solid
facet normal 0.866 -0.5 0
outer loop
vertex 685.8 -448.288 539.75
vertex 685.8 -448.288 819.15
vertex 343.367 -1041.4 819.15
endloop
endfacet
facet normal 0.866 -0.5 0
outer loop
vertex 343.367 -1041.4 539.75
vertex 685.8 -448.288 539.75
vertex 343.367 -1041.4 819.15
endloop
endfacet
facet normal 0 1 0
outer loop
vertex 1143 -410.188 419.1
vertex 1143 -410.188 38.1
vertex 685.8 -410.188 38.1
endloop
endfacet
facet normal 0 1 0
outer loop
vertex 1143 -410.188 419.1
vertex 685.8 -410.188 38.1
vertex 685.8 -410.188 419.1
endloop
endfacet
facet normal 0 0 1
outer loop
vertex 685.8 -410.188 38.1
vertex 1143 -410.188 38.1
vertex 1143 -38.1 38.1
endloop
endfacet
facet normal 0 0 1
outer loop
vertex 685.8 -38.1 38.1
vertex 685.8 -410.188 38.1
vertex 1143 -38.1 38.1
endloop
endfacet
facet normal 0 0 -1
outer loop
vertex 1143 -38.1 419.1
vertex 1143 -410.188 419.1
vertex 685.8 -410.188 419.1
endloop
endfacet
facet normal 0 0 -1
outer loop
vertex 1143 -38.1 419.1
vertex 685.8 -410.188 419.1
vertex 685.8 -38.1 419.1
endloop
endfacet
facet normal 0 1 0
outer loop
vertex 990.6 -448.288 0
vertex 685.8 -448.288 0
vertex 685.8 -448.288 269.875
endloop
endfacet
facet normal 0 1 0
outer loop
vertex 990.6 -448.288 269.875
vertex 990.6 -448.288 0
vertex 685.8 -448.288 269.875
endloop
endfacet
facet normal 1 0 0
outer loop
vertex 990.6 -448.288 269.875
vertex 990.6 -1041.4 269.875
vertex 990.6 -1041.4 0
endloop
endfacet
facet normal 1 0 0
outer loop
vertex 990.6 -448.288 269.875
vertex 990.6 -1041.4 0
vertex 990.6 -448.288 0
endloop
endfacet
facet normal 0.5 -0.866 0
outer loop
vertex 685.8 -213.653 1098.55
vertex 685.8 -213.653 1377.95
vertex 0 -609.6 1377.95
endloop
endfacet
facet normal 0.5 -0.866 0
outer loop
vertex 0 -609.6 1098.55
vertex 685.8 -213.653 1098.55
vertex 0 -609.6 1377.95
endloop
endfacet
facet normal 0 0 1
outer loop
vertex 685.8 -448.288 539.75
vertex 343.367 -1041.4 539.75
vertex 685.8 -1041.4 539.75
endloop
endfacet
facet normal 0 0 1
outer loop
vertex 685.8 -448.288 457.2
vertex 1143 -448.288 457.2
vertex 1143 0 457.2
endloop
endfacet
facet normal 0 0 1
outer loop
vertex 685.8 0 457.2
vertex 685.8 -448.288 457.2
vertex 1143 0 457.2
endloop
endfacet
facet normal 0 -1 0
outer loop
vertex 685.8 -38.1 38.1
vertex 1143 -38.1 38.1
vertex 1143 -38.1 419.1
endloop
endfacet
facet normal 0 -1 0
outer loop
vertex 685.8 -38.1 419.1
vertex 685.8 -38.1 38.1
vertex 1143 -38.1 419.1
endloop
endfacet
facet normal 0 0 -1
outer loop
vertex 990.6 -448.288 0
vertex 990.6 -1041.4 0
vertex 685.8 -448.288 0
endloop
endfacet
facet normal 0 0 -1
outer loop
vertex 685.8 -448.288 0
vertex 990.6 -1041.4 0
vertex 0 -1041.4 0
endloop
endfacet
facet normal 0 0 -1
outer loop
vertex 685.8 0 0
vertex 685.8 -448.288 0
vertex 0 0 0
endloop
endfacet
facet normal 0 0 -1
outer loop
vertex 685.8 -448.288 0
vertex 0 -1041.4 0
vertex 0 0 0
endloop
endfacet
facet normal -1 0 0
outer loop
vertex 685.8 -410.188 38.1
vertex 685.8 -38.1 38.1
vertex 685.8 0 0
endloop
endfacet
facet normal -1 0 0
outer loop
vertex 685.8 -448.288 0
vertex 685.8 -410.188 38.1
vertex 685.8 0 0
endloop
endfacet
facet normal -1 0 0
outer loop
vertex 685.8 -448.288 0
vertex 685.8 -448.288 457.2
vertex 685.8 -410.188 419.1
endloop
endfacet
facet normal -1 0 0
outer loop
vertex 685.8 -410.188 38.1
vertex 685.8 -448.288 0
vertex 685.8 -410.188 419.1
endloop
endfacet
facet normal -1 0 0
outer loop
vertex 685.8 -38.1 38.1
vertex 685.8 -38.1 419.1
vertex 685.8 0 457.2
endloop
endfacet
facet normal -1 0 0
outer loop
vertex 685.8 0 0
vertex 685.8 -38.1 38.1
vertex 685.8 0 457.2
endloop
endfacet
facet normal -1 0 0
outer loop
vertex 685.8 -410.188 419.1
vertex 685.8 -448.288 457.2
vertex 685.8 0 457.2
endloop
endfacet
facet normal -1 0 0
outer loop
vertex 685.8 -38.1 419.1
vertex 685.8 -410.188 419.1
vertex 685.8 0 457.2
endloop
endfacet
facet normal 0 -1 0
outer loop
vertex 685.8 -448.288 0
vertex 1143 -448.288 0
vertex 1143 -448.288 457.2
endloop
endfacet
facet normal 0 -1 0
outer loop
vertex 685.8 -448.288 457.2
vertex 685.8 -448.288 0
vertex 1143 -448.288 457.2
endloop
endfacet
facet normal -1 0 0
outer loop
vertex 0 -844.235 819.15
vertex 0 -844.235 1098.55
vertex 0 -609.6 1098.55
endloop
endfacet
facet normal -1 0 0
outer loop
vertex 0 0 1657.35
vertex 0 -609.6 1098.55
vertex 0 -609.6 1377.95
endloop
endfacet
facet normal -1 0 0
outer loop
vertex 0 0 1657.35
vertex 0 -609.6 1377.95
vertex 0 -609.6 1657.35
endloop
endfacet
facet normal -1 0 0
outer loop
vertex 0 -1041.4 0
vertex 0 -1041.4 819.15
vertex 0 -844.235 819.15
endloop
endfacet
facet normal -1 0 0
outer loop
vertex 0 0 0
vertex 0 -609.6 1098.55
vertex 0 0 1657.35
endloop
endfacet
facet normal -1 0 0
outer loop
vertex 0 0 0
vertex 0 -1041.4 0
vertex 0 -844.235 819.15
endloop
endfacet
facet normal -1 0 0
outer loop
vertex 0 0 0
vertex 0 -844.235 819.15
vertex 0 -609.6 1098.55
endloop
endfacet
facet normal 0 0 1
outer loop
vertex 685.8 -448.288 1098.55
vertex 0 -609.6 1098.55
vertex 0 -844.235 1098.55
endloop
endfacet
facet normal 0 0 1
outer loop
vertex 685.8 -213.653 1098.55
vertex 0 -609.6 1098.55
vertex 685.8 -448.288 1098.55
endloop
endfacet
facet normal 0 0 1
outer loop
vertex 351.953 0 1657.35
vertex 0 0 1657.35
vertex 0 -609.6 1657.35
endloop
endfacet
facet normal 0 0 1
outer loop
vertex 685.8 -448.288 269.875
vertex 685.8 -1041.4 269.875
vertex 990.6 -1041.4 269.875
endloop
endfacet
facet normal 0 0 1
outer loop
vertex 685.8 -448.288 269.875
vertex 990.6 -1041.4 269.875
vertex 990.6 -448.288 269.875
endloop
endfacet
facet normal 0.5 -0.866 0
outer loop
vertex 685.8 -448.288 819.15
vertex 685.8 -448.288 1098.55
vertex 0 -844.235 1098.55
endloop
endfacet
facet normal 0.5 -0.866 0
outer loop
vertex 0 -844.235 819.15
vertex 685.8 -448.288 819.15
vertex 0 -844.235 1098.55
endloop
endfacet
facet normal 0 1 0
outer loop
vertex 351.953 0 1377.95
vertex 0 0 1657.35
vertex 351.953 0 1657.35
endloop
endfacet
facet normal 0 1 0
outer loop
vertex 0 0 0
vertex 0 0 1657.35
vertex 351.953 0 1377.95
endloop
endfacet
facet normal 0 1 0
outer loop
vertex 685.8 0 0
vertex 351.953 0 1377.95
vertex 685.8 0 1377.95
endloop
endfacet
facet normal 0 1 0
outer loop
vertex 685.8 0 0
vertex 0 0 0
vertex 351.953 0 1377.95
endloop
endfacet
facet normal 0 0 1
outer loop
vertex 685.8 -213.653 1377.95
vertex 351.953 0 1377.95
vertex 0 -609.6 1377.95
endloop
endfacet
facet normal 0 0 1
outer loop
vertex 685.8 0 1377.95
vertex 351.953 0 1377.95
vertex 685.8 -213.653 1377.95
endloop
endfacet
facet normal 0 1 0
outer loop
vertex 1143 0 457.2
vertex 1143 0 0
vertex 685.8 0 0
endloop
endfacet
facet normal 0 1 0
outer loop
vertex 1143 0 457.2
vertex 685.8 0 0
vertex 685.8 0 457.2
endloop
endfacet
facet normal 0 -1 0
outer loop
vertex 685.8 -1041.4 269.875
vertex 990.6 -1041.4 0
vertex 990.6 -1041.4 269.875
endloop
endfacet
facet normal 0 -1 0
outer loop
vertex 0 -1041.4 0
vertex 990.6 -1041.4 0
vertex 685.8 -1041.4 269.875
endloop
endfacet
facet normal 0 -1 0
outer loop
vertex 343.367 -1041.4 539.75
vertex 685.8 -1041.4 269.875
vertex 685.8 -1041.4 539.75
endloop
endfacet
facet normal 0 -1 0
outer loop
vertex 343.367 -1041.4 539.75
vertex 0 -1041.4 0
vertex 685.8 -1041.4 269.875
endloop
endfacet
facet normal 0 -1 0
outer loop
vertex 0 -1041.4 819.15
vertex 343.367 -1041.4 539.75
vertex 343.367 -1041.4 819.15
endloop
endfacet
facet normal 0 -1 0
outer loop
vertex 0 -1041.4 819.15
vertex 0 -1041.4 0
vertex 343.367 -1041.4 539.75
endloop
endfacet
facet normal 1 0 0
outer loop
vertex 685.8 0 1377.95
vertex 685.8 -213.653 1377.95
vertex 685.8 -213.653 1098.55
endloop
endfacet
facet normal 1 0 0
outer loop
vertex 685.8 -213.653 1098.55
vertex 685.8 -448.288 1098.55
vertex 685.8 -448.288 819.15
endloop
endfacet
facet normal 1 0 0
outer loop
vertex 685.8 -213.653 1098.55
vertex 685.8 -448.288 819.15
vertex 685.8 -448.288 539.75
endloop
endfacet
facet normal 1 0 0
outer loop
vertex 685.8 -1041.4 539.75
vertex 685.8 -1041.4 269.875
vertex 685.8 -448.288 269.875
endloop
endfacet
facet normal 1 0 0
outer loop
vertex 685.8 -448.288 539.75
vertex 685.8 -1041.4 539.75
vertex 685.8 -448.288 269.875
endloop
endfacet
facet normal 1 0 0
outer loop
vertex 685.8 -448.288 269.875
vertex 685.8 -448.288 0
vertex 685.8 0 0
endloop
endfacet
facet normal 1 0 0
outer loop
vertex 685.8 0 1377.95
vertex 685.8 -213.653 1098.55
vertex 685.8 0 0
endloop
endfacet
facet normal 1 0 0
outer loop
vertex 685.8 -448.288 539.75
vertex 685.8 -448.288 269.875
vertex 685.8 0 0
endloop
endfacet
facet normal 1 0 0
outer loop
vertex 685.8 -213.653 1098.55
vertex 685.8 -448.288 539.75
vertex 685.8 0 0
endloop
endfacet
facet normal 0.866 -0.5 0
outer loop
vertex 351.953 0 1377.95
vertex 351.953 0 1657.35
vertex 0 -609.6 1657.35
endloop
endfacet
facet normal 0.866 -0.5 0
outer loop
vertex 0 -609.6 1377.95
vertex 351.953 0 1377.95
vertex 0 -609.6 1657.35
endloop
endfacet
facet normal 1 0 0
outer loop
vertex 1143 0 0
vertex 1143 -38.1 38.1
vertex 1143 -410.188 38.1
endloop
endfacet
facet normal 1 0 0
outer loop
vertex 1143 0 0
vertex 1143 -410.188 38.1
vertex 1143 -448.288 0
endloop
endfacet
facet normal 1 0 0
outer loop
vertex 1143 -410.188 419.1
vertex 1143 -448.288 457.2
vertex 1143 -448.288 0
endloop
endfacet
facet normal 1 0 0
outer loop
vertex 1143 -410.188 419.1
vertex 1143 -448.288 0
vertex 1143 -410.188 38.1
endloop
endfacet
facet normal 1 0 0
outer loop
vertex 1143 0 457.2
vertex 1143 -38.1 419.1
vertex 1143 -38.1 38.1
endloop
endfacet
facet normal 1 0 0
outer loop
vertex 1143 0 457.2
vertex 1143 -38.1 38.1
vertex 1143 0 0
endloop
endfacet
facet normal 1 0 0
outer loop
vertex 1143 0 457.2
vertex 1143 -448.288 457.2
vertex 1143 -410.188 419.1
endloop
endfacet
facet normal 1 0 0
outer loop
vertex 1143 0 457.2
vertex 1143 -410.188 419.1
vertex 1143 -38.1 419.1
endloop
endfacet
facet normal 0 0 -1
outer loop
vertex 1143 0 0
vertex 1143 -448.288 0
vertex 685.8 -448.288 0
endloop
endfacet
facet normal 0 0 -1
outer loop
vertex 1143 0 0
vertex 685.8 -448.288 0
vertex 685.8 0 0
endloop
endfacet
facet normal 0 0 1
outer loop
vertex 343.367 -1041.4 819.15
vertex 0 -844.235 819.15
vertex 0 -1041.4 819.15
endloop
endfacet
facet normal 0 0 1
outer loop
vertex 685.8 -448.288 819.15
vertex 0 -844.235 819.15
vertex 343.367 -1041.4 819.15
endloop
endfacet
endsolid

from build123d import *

# Parameters (mm, degrees)
F0_W      = 685.8
F0_H      = 1041.4
F1_DEPTH  = 1657.35
F3_DEPTH  = 279.4
F5_DEPTH  = 279.4
F7_DEPTH  = 279.4
F9_DEPTH  = 279.4
F10_W     = 593.1116652116
F10_H     = 269.875
F11_DEPTH = 304.8
F12_W     = 448.2883347884
F12_H     = 457.2
F13_DEPTH = 457.2
F14_W     = 372.0883347884
F14_H     = 381
F15_DEPTH = 1143.001


with BuildPart() as f1:
    # F0 (on Top) → F1 (new body)
    with BuildSketch(Plane.XY):
        with Locations((342.9, -520.7)):
            Rectangle(F0_W, F0_H)
    extrude(amount=F1_DEPTH)

    # F2 (on face) → F3 (cut)
    with BuildSketch(Plane.XY.offset(1657.35)):
        Polygon((351.952724098, 0), (0, -609.6), (0, -1041.4), (685.8, -1041.4), (685.8, 0), align=None)
    extrude(amount=-F3_DEPTH, mode=Mode.SUBTRACT)

    # F4 (on face) → F5 (cut)
    with BuildSketch(Plane.XY.offset(1377.95)):
        Polygon((0, -609.6), (0, -1041.4), (685.8, -1041.4), (685.8, -213.6531853898), align=None)
    extrude(amount=-F5_DEPTH, mode=Mode.SUBTRACT)

    # F6 (on face) → F7 (cut)
    with BuildSketch(Plane.XY.offset(1098.55)):
        Polygon((685.8, -448.2883347884), (0, -844.2351493987), (0, -1041.4), (685.8, -1041.4), align=None)
    extrude(amount=-F7_DEPTH, mode=Mode.SUBTRACT)

    # F8 (on face) → F9 (cut)
    with BuildSketch(Plane.XY.offset(819.15)):
        Polygon((685.8, -448.2883347884), (343.3668204306, -1041.4), (685.8, -1041.4), align=None)
    extrude(amount=-F9_DEPTH, mode=Mode.SUBTRACT)

    # F10 (on face) → F11 (join)
    with BuildSketch(Plane.YZ.offset(685.8)):
        with Locations((-744.8441673942, 134.9375)):
            Rectangle(F10_W, F10_H)
    extrude(amount=F11_DEPTH)


with BuildPart() as f13:
    # F12 (on face) → F13 (new body)
    with BuildSketch(Plane.YZ.offset(685.8)):
        with Locations((-224.1441673942, 228.6)):
            Rectangle(F12_W, F12_H)
    extrude(amount=F13_DEPTH)

    # F14 (on face) → F15 (cut, through all)
    with BuildSketch(Plane.YZ.offset(1143)):
        with Locations((-224.1441673942, 228.6)):
            Rectangle(F14_W, F14_H)
    extrude(amount=-F15_DEPTH, mode=Mode.SUBTRACT)


solid = Compound([f1.part, f13.part])
